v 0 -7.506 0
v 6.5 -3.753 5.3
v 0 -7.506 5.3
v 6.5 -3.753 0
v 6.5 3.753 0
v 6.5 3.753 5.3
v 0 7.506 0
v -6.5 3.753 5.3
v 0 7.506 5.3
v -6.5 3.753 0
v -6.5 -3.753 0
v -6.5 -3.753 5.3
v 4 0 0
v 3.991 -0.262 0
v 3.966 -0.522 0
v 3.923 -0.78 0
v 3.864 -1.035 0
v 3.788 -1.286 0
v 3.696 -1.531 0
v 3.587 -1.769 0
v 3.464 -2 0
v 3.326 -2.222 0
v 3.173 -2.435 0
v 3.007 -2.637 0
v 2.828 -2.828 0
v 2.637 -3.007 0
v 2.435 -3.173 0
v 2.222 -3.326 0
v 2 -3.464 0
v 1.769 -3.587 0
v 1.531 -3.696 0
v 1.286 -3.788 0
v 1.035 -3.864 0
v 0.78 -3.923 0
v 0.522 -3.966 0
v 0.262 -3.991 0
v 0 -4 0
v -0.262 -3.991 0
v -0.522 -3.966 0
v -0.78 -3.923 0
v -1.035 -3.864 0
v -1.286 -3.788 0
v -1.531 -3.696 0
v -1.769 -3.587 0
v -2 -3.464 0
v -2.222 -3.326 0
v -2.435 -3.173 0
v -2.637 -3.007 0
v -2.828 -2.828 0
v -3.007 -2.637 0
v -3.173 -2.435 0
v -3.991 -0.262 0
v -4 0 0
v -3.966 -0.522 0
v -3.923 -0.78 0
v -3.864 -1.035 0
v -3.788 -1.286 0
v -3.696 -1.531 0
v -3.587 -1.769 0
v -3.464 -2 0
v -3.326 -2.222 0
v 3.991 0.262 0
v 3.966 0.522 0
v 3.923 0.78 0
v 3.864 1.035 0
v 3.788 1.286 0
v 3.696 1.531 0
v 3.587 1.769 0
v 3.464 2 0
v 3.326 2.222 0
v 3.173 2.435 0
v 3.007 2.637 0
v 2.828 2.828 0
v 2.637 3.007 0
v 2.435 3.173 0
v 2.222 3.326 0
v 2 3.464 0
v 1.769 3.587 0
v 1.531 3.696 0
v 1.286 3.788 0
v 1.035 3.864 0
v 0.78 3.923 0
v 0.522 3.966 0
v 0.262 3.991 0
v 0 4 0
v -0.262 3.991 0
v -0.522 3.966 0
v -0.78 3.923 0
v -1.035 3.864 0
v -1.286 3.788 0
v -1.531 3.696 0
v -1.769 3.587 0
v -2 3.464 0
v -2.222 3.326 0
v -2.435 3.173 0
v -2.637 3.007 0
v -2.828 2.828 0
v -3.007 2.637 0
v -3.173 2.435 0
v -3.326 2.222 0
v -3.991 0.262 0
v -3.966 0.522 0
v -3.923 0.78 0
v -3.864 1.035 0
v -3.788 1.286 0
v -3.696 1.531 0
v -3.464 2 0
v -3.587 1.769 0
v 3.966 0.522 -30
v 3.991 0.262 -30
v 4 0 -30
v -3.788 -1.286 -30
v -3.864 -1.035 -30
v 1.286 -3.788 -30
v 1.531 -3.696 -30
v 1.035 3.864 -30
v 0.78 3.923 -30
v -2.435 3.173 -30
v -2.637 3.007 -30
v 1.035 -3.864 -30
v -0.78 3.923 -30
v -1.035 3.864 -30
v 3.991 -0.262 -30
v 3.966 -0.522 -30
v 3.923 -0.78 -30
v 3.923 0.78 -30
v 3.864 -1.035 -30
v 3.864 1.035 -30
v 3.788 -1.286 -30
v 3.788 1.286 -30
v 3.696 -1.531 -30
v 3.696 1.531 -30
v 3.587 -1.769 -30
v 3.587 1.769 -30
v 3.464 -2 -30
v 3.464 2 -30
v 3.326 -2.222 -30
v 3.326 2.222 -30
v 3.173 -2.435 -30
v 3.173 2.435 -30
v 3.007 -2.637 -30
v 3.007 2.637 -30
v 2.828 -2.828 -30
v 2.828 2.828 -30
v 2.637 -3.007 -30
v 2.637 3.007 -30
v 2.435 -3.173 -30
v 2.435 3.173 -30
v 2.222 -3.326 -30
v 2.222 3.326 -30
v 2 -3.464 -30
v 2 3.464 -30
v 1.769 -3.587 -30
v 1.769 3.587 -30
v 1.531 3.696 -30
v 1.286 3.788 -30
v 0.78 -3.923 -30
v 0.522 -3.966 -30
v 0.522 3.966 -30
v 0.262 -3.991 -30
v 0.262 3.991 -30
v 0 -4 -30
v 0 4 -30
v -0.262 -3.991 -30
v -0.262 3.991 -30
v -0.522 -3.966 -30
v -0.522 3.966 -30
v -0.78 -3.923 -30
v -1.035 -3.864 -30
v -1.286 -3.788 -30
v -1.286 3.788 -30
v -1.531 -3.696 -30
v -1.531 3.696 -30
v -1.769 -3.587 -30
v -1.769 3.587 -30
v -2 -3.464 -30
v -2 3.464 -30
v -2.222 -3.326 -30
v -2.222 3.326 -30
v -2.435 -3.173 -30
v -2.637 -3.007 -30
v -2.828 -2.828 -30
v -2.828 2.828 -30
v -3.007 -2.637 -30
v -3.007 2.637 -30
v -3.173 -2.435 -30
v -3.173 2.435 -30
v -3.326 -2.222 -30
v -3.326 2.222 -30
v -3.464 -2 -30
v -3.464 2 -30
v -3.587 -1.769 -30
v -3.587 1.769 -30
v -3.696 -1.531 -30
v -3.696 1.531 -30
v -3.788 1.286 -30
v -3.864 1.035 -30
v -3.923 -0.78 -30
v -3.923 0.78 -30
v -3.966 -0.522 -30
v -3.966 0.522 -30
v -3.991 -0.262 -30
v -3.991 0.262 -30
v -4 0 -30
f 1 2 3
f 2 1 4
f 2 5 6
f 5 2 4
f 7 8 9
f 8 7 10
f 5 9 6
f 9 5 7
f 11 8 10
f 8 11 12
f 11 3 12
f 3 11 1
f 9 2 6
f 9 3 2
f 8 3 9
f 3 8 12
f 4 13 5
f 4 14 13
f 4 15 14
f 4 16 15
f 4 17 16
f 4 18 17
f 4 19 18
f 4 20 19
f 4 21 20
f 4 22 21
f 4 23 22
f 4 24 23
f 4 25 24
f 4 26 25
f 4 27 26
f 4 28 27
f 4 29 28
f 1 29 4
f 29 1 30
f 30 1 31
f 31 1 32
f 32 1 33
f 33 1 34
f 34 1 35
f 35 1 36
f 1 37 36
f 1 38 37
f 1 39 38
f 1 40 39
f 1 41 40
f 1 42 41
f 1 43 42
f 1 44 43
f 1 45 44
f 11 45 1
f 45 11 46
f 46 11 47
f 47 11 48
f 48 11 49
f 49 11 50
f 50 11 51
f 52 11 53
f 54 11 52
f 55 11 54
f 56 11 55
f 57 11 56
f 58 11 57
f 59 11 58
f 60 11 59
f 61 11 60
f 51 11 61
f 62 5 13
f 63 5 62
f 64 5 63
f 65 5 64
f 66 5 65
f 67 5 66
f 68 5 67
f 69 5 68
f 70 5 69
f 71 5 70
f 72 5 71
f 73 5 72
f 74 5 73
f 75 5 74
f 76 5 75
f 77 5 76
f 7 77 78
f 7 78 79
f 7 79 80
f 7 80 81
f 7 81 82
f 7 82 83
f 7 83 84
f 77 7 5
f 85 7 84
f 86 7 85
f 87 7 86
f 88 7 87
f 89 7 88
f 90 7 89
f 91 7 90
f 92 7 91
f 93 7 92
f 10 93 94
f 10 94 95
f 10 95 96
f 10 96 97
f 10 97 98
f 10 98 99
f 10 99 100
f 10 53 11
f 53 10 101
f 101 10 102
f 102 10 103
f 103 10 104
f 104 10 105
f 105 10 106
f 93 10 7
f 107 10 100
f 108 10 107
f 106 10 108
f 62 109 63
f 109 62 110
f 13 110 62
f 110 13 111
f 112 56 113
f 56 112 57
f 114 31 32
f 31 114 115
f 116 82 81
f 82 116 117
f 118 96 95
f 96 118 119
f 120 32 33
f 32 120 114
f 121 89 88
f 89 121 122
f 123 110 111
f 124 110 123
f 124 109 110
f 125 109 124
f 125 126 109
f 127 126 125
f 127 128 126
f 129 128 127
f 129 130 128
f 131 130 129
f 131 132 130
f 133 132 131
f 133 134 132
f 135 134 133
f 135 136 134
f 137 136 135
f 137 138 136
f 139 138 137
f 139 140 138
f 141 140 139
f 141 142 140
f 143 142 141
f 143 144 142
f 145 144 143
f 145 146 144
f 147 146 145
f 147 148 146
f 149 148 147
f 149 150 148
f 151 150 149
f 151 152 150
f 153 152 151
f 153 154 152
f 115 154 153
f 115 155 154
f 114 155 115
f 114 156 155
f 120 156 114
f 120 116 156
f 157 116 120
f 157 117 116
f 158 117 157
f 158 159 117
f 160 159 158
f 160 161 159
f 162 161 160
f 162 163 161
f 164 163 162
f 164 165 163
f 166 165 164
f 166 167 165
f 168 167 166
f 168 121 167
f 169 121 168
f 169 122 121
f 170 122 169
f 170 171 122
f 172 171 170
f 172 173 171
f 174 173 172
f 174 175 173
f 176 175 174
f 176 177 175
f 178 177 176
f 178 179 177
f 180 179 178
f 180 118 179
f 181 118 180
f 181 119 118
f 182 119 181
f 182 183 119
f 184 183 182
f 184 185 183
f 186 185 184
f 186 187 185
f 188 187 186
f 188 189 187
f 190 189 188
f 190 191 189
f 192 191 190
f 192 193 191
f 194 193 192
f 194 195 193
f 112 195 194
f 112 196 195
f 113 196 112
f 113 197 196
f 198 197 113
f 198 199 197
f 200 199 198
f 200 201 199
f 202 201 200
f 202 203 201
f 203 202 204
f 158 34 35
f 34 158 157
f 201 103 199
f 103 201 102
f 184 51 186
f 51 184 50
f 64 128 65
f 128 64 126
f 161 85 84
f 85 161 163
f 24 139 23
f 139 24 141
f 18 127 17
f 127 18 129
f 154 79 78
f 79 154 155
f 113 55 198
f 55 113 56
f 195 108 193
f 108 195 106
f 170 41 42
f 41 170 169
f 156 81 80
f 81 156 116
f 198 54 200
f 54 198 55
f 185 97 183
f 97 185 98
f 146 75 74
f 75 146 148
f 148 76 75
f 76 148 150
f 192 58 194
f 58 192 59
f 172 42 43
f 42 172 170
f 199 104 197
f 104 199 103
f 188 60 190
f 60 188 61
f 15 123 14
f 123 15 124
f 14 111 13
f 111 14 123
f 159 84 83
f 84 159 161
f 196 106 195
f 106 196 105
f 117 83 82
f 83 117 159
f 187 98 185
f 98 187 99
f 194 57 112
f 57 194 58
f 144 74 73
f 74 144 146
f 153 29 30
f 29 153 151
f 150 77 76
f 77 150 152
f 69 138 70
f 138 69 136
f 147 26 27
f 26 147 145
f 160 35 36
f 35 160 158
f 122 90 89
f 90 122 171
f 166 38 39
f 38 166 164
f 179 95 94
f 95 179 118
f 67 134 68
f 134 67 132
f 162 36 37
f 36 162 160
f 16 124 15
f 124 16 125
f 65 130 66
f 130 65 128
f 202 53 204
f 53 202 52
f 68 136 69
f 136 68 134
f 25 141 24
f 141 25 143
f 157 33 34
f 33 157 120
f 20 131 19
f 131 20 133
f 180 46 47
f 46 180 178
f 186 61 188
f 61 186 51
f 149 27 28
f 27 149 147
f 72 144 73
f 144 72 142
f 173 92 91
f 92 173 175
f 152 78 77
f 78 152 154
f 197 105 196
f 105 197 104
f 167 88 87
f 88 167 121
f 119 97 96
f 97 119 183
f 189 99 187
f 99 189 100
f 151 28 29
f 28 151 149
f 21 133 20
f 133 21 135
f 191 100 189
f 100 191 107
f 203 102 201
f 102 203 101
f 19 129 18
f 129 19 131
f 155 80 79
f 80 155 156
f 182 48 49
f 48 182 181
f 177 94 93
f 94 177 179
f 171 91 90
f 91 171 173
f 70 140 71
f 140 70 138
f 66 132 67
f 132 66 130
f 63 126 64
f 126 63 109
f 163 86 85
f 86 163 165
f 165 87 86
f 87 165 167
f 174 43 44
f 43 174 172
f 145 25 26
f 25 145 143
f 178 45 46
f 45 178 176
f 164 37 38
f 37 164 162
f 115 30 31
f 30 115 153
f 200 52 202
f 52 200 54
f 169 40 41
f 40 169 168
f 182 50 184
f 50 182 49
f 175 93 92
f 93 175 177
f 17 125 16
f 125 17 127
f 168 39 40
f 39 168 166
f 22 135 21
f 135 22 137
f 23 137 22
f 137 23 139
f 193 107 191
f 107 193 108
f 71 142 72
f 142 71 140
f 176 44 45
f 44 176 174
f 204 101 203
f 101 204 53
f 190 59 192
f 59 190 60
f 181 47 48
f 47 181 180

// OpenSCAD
$fn = 96;

across_flats = 13;
head_height = 5.3;
shank_diameter = 8;
shank_length = 30;

hex_circumradius = across_flats / sqrt(3);

union() {
    // 六角ボルト頭部
    rotate([0, 0, 30])
        cylinder(
            h = head_height,
            r = hex_circumradius,
            $fn = 6
        );

    // シャンク
    translate([0, 0, -shank_length])
        cylinder(
            h = shank_length,
            d = shank_diameter
        );
}
